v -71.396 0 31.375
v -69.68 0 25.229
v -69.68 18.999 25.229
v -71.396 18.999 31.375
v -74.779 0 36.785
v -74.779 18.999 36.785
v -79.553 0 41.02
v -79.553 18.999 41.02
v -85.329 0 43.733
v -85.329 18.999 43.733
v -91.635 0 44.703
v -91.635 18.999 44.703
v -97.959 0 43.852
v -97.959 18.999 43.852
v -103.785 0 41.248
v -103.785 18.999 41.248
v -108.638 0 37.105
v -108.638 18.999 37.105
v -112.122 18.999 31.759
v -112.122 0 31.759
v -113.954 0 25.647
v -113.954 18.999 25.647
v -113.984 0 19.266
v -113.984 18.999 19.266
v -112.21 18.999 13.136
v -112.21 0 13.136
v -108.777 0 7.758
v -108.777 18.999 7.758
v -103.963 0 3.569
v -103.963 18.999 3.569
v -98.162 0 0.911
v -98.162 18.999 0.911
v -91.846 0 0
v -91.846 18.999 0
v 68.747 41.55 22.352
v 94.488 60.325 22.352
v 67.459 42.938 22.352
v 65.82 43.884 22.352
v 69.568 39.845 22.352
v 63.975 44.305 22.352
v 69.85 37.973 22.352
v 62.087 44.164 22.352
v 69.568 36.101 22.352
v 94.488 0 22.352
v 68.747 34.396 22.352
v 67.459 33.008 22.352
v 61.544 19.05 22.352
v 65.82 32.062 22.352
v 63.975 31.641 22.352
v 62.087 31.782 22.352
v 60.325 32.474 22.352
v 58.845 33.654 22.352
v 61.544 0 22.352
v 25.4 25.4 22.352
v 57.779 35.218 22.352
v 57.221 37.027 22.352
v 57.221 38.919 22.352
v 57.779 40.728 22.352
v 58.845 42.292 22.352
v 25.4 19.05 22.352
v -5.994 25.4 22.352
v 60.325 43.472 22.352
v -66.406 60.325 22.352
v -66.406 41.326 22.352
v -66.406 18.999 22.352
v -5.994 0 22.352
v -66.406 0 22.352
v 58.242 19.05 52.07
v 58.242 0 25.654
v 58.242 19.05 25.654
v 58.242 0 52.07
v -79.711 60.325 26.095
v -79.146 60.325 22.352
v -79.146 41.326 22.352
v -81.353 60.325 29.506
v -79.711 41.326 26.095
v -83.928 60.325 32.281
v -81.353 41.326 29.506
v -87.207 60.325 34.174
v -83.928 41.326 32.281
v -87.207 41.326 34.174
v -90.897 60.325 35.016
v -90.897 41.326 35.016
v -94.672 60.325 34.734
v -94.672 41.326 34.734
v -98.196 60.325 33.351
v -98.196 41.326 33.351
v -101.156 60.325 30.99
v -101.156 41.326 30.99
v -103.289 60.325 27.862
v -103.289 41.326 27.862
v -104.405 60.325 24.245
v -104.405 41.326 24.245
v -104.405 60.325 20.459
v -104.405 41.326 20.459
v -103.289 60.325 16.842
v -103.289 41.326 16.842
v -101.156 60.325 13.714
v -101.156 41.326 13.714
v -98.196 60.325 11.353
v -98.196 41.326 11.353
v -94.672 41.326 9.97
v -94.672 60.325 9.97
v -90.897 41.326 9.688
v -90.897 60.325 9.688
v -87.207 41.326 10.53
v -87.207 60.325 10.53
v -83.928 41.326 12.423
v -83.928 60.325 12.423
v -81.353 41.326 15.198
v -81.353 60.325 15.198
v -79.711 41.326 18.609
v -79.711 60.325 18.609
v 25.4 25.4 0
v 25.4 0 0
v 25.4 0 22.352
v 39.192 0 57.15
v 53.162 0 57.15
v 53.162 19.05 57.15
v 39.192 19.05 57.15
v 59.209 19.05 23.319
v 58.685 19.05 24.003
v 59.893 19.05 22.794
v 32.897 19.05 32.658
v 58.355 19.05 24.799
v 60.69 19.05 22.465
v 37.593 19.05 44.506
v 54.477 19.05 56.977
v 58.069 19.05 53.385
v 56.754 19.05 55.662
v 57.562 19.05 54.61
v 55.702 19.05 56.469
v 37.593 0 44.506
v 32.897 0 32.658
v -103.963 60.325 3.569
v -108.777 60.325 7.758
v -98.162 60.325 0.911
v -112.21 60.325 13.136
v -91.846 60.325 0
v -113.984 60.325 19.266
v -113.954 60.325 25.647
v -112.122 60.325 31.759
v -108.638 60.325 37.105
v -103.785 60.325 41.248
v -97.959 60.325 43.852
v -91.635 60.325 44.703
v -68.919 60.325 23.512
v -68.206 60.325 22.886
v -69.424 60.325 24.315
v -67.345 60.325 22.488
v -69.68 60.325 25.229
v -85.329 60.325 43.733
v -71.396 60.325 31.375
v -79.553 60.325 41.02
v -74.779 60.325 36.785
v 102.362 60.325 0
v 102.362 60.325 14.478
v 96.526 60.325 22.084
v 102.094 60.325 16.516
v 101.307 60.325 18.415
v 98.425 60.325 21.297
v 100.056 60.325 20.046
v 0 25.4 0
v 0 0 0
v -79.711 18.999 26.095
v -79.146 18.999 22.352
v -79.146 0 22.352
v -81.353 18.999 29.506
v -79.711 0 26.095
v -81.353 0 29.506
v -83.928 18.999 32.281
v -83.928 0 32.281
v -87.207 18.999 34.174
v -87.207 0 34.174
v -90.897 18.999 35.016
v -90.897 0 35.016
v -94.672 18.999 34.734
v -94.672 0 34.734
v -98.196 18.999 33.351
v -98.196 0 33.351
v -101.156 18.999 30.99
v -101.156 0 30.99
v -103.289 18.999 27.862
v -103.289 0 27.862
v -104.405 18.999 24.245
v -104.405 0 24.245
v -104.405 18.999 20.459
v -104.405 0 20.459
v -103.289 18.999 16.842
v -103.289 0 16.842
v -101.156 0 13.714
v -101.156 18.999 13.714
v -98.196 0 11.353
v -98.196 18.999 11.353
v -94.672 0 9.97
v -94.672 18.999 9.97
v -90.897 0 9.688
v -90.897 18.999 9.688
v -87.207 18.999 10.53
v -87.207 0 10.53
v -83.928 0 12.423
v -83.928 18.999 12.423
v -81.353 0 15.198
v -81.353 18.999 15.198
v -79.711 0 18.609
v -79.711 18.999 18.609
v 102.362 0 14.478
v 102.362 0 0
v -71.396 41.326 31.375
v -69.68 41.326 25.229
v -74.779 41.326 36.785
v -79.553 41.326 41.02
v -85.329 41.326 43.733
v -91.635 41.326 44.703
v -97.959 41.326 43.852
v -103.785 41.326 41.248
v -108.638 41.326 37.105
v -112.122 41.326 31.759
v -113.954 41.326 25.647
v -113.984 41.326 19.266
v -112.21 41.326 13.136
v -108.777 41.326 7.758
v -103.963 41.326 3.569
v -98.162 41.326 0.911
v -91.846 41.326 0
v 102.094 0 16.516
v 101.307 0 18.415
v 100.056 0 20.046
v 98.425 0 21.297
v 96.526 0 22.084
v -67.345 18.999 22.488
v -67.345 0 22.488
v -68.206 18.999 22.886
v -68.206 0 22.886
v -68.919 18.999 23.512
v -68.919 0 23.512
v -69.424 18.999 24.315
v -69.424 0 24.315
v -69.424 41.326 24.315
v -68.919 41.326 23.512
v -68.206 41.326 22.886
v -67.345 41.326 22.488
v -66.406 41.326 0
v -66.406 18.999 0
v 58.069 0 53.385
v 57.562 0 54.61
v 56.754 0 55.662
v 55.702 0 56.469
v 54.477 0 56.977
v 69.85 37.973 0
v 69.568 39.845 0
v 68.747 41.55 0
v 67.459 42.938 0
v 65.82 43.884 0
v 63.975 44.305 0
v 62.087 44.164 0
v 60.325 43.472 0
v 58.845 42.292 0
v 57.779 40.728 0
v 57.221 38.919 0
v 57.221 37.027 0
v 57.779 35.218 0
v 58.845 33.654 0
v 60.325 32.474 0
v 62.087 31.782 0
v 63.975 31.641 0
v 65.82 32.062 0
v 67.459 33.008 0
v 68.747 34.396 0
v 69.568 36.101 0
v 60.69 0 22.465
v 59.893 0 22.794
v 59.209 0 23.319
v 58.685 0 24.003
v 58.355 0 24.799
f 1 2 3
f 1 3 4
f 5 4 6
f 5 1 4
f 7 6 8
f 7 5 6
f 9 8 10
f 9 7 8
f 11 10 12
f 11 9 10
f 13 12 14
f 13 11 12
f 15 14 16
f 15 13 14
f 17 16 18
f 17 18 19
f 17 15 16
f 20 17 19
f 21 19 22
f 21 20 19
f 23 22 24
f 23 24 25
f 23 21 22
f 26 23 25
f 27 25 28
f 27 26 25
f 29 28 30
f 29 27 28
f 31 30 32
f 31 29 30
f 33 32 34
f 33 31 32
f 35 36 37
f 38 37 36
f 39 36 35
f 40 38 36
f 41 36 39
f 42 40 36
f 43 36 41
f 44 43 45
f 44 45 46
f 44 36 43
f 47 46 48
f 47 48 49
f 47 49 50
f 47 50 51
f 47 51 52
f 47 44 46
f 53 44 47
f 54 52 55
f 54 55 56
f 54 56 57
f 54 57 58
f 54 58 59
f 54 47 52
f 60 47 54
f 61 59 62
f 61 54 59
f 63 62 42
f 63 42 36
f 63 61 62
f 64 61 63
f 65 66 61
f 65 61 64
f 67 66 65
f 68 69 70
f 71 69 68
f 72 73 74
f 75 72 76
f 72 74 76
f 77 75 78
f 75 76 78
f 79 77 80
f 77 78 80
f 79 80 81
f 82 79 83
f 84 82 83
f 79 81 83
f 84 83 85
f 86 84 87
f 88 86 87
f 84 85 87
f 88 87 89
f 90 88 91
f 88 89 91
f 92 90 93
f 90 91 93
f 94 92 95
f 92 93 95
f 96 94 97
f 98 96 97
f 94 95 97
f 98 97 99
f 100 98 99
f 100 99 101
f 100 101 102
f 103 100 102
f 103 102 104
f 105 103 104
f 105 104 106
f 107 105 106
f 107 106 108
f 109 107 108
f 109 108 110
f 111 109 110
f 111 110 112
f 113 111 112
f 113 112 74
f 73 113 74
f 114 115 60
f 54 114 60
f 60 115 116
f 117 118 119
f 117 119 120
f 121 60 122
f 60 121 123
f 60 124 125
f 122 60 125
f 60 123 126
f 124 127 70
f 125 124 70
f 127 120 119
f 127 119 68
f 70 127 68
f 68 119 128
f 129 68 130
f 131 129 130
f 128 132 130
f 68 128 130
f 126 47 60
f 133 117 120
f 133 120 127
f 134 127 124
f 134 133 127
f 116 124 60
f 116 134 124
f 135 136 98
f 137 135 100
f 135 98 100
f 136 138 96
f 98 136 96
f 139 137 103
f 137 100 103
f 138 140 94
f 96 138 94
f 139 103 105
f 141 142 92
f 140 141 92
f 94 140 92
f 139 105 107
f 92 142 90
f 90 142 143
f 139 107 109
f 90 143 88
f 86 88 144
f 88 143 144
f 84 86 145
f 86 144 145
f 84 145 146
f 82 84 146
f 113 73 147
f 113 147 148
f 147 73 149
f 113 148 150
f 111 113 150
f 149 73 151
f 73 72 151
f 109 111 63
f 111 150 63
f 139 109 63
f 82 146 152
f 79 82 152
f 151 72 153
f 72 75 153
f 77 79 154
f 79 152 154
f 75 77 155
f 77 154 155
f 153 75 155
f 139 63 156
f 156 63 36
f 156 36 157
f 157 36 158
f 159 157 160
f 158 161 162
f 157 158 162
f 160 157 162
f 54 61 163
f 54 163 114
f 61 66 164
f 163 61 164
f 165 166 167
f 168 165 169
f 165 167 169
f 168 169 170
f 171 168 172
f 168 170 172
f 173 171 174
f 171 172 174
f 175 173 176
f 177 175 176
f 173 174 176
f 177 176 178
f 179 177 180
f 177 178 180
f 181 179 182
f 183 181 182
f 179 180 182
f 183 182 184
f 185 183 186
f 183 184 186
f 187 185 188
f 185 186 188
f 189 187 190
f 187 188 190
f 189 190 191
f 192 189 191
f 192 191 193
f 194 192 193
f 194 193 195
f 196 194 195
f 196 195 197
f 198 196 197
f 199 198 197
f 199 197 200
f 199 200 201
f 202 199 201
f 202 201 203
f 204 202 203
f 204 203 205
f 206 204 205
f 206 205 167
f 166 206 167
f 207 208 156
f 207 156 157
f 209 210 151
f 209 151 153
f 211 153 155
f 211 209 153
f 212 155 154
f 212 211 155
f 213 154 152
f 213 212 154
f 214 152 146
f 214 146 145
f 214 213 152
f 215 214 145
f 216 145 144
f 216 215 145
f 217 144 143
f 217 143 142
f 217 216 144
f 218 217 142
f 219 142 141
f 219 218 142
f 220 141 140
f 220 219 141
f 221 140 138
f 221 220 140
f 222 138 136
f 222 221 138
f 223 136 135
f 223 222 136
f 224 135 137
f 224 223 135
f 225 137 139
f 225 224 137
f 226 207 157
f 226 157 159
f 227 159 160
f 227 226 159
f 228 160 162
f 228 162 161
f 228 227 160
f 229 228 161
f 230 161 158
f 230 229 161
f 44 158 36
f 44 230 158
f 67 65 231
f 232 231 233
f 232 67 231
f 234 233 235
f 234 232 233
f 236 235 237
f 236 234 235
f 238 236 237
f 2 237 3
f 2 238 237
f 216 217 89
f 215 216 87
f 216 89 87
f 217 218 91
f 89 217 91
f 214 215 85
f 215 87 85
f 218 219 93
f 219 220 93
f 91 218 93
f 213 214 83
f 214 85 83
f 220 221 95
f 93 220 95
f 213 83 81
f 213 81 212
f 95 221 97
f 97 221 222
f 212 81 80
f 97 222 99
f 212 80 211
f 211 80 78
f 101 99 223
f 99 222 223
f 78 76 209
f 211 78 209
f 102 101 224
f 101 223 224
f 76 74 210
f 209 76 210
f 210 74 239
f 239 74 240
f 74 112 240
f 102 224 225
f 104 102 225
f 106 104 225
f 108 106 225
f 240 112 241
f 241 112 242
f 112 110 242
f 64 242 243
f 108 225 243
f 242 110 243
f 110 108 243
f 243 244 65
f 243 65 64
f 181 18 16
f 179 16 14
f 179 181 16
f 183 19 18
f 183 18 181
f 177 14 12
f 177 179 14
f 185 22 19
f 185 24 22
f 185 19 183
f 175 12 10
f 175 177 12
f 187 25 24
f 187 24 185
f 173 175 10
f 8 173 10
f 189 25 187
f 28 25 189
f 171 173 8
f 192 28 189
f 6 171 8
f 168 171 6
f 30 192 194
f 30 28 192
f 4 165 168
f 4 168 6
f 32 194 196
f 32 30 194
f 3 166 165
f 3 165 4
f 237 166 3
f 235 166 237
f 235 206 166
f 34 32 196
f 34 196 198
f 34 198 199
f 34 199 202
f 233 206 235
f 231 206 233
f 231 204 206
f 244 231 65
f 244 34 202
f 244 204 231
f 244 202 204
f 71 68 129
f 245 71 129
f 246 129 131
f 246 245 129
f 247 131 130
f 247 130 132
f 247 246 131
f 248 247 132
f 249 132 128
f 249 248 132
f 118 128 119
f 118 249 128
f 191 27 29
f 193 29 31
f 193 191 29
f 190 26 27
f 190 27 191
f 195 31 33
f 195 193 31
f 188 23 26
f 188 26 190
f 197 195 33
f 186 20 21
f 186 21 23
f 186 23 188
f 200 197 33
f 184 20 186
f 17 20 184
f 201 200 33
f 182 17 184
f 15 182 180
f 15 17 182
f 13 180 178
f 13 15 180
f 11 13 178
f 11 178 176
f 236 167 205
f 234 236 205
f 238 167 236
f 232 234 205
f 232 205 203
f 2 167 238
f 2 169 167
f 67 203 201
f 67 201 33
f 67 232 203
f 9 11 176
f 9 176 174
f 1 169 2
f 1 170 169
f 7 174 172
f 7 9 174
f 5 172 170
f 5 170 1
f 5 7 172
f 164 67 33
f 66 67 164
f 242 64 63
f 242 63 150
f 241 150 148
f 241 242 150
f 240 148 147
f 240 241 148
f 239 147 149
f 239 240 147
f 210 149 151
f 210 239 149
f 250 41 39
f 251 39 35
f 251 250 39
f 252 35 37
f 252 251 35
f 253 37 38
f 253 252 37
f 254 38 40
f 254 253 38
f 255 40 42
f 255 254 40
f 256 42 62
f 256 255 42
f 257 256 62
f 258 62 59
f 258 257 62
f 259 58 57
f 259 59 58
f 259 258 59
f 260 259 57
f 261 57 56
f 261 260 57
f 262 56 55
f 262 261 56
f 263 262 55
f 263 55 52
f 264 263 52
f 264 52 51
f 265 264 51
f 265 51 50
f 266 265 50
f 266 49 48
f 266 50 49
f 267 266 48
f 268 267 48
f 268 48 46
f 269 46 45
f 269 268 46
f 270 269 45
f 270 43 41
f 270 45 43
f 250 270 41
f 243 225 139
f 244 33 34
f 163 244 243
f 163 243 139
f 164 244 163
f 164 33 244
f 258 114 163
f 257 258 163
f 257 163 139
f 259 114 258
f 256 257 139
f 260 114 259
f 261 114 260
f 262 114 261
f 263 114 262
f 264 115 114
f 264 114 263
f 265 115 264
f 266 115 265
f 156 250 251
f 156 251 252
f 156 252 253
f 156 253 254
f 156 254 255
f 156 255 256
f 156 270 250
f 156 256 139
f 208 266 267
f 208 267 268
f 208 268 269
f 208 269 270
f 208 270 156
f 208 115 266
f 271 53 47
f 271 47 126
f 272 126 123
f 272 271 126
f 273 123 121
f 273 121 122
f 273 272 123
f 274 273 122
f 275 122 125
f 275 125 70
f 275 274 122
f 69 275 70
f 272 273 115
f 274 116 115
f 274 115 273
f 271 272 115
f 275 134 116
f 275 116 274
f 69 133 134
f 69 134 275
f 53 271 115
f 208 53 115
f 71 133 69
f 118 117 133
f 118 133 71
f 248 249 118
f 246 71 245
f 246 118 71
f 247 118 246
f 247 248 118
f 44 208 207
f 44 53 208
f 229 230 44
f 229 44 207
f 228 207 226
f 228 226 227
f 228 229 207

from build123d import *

# Parameters (mm, degrees)
F0_R     = 12.7
F1_DEPTH = 60.325
F2_DEPTH = 19.05
F3_DEPTH = 19.05
F4_DEPTH = 25.4
F5_R     = 6.35
F5_W     = 50.881216
F5_H     = 22.3266
F6_DEPTH = 57.151


with BuildPart() as f1:
    # F0 (on Front) → F1 (new body)
    with BuildSketch(Plane.XZ):
        with BuildLine():
            Line((-91.8464, 0), (0, 0))
            Line((0, 0), (-5.9944, 22.352))
            Line((-5.9944, 22.352), (-66.405792, 22.352))
            ThreePointArc((-66.405792, 22.352), (-68.585221, 23.173417), (-69.680326, 25.22899))
            ThreePointArc((-69.680326, 25.22899), (-108.638041, 37.105058), (-91.8464, 0))
        make_face()
        with Locations((-91.8464, 22.352)):
            Circle(F0_R, mode=Mode.SUBTRACT)
        with BuildLine():
            Line((25.4, 22.352), (25.4, 0))
            Line((25.4, 0), (102.362, 0))
            Line((102.362, 0), (102.362, 14.478))
            ThreePointArc((102.362, 14.478), (100.055759, 20.045759), (94.488, 22.352))
            Line((94.488, 22.352), (61.5442, 22.352))
            Line((61.5442, 22.352), (58.2422, 22.352))
            Line((58.2422, 22.352), (39.1922, 22.352))
            Line((39.1922, 22.352), (25.4, 22.352))
        make_face()
        Polygon((-5.9944, 22.352), (0, 0), (25.4, 0), (25.4, 22.352), align=None)
    extrude(amount=-F1_DEPTH)

    # F0 (on Front) → F2 (join)
    with BuildSketch(Plane.XZ):
        with BuildLine():
            ThreePointArc((39.1922, 57.15), (35.618015, 38.434358), (25.4, 22.352))
            Line((25.4, 22.352), (39.1922, 22.352))
            Line((39.1922, 22.352), (58.2422, 22.352))
            Line((58.2422, 22.352), (61.5442, 22.352))
            ThreePointArc((61.5442, 22.352), (59.209333, 23.319133), (58.2422, 25.654))
            Line((58.2422, 25.654), (58.2422, 52.07))
            ThreePointArc((58.2422, 52.07), (56.754302, 55.662102), (53.1622, 57.15))
            Line((53.1622, 57.15), (39.1922, 57.15))
        make_face()
    extrude(amount=-F2_DEPTH)

    # F0 (on Front) → F3 (cut)
    with BuildSketch(Plane.XZ):
        Polygon((-5.9944, 22.352), (0, 0), (25.4, 0), (25.4, 22.352), align=None)
    extrude(amount=-F3_DEPTH, mode=Mode.SUBTRACT)

    # F0 (on Front) → F4 (cut)
    with BuildSketch(Plane.XZ):
        Polygon((-5.9944, 22.352), (0, 0), (25.4, 0), (25.4, 22.352), align=None)
    extrude(amount=-F4_DEPTH, mode=Mode.SUBTRACT)

    # F5 (on Top) → F6 (cut, through all)
    with BuildSketch(Plane.XY):
        with Locations((63.5, 37.973)):
            Circle(F5_R)
        with Locations((-91.8464, 30.1625)):
            Rectangle(F5_W, F5_H)
    extrude(amount=F6_DEPTH, mode=Mode.SUBTRACT)


solid = f1.part
